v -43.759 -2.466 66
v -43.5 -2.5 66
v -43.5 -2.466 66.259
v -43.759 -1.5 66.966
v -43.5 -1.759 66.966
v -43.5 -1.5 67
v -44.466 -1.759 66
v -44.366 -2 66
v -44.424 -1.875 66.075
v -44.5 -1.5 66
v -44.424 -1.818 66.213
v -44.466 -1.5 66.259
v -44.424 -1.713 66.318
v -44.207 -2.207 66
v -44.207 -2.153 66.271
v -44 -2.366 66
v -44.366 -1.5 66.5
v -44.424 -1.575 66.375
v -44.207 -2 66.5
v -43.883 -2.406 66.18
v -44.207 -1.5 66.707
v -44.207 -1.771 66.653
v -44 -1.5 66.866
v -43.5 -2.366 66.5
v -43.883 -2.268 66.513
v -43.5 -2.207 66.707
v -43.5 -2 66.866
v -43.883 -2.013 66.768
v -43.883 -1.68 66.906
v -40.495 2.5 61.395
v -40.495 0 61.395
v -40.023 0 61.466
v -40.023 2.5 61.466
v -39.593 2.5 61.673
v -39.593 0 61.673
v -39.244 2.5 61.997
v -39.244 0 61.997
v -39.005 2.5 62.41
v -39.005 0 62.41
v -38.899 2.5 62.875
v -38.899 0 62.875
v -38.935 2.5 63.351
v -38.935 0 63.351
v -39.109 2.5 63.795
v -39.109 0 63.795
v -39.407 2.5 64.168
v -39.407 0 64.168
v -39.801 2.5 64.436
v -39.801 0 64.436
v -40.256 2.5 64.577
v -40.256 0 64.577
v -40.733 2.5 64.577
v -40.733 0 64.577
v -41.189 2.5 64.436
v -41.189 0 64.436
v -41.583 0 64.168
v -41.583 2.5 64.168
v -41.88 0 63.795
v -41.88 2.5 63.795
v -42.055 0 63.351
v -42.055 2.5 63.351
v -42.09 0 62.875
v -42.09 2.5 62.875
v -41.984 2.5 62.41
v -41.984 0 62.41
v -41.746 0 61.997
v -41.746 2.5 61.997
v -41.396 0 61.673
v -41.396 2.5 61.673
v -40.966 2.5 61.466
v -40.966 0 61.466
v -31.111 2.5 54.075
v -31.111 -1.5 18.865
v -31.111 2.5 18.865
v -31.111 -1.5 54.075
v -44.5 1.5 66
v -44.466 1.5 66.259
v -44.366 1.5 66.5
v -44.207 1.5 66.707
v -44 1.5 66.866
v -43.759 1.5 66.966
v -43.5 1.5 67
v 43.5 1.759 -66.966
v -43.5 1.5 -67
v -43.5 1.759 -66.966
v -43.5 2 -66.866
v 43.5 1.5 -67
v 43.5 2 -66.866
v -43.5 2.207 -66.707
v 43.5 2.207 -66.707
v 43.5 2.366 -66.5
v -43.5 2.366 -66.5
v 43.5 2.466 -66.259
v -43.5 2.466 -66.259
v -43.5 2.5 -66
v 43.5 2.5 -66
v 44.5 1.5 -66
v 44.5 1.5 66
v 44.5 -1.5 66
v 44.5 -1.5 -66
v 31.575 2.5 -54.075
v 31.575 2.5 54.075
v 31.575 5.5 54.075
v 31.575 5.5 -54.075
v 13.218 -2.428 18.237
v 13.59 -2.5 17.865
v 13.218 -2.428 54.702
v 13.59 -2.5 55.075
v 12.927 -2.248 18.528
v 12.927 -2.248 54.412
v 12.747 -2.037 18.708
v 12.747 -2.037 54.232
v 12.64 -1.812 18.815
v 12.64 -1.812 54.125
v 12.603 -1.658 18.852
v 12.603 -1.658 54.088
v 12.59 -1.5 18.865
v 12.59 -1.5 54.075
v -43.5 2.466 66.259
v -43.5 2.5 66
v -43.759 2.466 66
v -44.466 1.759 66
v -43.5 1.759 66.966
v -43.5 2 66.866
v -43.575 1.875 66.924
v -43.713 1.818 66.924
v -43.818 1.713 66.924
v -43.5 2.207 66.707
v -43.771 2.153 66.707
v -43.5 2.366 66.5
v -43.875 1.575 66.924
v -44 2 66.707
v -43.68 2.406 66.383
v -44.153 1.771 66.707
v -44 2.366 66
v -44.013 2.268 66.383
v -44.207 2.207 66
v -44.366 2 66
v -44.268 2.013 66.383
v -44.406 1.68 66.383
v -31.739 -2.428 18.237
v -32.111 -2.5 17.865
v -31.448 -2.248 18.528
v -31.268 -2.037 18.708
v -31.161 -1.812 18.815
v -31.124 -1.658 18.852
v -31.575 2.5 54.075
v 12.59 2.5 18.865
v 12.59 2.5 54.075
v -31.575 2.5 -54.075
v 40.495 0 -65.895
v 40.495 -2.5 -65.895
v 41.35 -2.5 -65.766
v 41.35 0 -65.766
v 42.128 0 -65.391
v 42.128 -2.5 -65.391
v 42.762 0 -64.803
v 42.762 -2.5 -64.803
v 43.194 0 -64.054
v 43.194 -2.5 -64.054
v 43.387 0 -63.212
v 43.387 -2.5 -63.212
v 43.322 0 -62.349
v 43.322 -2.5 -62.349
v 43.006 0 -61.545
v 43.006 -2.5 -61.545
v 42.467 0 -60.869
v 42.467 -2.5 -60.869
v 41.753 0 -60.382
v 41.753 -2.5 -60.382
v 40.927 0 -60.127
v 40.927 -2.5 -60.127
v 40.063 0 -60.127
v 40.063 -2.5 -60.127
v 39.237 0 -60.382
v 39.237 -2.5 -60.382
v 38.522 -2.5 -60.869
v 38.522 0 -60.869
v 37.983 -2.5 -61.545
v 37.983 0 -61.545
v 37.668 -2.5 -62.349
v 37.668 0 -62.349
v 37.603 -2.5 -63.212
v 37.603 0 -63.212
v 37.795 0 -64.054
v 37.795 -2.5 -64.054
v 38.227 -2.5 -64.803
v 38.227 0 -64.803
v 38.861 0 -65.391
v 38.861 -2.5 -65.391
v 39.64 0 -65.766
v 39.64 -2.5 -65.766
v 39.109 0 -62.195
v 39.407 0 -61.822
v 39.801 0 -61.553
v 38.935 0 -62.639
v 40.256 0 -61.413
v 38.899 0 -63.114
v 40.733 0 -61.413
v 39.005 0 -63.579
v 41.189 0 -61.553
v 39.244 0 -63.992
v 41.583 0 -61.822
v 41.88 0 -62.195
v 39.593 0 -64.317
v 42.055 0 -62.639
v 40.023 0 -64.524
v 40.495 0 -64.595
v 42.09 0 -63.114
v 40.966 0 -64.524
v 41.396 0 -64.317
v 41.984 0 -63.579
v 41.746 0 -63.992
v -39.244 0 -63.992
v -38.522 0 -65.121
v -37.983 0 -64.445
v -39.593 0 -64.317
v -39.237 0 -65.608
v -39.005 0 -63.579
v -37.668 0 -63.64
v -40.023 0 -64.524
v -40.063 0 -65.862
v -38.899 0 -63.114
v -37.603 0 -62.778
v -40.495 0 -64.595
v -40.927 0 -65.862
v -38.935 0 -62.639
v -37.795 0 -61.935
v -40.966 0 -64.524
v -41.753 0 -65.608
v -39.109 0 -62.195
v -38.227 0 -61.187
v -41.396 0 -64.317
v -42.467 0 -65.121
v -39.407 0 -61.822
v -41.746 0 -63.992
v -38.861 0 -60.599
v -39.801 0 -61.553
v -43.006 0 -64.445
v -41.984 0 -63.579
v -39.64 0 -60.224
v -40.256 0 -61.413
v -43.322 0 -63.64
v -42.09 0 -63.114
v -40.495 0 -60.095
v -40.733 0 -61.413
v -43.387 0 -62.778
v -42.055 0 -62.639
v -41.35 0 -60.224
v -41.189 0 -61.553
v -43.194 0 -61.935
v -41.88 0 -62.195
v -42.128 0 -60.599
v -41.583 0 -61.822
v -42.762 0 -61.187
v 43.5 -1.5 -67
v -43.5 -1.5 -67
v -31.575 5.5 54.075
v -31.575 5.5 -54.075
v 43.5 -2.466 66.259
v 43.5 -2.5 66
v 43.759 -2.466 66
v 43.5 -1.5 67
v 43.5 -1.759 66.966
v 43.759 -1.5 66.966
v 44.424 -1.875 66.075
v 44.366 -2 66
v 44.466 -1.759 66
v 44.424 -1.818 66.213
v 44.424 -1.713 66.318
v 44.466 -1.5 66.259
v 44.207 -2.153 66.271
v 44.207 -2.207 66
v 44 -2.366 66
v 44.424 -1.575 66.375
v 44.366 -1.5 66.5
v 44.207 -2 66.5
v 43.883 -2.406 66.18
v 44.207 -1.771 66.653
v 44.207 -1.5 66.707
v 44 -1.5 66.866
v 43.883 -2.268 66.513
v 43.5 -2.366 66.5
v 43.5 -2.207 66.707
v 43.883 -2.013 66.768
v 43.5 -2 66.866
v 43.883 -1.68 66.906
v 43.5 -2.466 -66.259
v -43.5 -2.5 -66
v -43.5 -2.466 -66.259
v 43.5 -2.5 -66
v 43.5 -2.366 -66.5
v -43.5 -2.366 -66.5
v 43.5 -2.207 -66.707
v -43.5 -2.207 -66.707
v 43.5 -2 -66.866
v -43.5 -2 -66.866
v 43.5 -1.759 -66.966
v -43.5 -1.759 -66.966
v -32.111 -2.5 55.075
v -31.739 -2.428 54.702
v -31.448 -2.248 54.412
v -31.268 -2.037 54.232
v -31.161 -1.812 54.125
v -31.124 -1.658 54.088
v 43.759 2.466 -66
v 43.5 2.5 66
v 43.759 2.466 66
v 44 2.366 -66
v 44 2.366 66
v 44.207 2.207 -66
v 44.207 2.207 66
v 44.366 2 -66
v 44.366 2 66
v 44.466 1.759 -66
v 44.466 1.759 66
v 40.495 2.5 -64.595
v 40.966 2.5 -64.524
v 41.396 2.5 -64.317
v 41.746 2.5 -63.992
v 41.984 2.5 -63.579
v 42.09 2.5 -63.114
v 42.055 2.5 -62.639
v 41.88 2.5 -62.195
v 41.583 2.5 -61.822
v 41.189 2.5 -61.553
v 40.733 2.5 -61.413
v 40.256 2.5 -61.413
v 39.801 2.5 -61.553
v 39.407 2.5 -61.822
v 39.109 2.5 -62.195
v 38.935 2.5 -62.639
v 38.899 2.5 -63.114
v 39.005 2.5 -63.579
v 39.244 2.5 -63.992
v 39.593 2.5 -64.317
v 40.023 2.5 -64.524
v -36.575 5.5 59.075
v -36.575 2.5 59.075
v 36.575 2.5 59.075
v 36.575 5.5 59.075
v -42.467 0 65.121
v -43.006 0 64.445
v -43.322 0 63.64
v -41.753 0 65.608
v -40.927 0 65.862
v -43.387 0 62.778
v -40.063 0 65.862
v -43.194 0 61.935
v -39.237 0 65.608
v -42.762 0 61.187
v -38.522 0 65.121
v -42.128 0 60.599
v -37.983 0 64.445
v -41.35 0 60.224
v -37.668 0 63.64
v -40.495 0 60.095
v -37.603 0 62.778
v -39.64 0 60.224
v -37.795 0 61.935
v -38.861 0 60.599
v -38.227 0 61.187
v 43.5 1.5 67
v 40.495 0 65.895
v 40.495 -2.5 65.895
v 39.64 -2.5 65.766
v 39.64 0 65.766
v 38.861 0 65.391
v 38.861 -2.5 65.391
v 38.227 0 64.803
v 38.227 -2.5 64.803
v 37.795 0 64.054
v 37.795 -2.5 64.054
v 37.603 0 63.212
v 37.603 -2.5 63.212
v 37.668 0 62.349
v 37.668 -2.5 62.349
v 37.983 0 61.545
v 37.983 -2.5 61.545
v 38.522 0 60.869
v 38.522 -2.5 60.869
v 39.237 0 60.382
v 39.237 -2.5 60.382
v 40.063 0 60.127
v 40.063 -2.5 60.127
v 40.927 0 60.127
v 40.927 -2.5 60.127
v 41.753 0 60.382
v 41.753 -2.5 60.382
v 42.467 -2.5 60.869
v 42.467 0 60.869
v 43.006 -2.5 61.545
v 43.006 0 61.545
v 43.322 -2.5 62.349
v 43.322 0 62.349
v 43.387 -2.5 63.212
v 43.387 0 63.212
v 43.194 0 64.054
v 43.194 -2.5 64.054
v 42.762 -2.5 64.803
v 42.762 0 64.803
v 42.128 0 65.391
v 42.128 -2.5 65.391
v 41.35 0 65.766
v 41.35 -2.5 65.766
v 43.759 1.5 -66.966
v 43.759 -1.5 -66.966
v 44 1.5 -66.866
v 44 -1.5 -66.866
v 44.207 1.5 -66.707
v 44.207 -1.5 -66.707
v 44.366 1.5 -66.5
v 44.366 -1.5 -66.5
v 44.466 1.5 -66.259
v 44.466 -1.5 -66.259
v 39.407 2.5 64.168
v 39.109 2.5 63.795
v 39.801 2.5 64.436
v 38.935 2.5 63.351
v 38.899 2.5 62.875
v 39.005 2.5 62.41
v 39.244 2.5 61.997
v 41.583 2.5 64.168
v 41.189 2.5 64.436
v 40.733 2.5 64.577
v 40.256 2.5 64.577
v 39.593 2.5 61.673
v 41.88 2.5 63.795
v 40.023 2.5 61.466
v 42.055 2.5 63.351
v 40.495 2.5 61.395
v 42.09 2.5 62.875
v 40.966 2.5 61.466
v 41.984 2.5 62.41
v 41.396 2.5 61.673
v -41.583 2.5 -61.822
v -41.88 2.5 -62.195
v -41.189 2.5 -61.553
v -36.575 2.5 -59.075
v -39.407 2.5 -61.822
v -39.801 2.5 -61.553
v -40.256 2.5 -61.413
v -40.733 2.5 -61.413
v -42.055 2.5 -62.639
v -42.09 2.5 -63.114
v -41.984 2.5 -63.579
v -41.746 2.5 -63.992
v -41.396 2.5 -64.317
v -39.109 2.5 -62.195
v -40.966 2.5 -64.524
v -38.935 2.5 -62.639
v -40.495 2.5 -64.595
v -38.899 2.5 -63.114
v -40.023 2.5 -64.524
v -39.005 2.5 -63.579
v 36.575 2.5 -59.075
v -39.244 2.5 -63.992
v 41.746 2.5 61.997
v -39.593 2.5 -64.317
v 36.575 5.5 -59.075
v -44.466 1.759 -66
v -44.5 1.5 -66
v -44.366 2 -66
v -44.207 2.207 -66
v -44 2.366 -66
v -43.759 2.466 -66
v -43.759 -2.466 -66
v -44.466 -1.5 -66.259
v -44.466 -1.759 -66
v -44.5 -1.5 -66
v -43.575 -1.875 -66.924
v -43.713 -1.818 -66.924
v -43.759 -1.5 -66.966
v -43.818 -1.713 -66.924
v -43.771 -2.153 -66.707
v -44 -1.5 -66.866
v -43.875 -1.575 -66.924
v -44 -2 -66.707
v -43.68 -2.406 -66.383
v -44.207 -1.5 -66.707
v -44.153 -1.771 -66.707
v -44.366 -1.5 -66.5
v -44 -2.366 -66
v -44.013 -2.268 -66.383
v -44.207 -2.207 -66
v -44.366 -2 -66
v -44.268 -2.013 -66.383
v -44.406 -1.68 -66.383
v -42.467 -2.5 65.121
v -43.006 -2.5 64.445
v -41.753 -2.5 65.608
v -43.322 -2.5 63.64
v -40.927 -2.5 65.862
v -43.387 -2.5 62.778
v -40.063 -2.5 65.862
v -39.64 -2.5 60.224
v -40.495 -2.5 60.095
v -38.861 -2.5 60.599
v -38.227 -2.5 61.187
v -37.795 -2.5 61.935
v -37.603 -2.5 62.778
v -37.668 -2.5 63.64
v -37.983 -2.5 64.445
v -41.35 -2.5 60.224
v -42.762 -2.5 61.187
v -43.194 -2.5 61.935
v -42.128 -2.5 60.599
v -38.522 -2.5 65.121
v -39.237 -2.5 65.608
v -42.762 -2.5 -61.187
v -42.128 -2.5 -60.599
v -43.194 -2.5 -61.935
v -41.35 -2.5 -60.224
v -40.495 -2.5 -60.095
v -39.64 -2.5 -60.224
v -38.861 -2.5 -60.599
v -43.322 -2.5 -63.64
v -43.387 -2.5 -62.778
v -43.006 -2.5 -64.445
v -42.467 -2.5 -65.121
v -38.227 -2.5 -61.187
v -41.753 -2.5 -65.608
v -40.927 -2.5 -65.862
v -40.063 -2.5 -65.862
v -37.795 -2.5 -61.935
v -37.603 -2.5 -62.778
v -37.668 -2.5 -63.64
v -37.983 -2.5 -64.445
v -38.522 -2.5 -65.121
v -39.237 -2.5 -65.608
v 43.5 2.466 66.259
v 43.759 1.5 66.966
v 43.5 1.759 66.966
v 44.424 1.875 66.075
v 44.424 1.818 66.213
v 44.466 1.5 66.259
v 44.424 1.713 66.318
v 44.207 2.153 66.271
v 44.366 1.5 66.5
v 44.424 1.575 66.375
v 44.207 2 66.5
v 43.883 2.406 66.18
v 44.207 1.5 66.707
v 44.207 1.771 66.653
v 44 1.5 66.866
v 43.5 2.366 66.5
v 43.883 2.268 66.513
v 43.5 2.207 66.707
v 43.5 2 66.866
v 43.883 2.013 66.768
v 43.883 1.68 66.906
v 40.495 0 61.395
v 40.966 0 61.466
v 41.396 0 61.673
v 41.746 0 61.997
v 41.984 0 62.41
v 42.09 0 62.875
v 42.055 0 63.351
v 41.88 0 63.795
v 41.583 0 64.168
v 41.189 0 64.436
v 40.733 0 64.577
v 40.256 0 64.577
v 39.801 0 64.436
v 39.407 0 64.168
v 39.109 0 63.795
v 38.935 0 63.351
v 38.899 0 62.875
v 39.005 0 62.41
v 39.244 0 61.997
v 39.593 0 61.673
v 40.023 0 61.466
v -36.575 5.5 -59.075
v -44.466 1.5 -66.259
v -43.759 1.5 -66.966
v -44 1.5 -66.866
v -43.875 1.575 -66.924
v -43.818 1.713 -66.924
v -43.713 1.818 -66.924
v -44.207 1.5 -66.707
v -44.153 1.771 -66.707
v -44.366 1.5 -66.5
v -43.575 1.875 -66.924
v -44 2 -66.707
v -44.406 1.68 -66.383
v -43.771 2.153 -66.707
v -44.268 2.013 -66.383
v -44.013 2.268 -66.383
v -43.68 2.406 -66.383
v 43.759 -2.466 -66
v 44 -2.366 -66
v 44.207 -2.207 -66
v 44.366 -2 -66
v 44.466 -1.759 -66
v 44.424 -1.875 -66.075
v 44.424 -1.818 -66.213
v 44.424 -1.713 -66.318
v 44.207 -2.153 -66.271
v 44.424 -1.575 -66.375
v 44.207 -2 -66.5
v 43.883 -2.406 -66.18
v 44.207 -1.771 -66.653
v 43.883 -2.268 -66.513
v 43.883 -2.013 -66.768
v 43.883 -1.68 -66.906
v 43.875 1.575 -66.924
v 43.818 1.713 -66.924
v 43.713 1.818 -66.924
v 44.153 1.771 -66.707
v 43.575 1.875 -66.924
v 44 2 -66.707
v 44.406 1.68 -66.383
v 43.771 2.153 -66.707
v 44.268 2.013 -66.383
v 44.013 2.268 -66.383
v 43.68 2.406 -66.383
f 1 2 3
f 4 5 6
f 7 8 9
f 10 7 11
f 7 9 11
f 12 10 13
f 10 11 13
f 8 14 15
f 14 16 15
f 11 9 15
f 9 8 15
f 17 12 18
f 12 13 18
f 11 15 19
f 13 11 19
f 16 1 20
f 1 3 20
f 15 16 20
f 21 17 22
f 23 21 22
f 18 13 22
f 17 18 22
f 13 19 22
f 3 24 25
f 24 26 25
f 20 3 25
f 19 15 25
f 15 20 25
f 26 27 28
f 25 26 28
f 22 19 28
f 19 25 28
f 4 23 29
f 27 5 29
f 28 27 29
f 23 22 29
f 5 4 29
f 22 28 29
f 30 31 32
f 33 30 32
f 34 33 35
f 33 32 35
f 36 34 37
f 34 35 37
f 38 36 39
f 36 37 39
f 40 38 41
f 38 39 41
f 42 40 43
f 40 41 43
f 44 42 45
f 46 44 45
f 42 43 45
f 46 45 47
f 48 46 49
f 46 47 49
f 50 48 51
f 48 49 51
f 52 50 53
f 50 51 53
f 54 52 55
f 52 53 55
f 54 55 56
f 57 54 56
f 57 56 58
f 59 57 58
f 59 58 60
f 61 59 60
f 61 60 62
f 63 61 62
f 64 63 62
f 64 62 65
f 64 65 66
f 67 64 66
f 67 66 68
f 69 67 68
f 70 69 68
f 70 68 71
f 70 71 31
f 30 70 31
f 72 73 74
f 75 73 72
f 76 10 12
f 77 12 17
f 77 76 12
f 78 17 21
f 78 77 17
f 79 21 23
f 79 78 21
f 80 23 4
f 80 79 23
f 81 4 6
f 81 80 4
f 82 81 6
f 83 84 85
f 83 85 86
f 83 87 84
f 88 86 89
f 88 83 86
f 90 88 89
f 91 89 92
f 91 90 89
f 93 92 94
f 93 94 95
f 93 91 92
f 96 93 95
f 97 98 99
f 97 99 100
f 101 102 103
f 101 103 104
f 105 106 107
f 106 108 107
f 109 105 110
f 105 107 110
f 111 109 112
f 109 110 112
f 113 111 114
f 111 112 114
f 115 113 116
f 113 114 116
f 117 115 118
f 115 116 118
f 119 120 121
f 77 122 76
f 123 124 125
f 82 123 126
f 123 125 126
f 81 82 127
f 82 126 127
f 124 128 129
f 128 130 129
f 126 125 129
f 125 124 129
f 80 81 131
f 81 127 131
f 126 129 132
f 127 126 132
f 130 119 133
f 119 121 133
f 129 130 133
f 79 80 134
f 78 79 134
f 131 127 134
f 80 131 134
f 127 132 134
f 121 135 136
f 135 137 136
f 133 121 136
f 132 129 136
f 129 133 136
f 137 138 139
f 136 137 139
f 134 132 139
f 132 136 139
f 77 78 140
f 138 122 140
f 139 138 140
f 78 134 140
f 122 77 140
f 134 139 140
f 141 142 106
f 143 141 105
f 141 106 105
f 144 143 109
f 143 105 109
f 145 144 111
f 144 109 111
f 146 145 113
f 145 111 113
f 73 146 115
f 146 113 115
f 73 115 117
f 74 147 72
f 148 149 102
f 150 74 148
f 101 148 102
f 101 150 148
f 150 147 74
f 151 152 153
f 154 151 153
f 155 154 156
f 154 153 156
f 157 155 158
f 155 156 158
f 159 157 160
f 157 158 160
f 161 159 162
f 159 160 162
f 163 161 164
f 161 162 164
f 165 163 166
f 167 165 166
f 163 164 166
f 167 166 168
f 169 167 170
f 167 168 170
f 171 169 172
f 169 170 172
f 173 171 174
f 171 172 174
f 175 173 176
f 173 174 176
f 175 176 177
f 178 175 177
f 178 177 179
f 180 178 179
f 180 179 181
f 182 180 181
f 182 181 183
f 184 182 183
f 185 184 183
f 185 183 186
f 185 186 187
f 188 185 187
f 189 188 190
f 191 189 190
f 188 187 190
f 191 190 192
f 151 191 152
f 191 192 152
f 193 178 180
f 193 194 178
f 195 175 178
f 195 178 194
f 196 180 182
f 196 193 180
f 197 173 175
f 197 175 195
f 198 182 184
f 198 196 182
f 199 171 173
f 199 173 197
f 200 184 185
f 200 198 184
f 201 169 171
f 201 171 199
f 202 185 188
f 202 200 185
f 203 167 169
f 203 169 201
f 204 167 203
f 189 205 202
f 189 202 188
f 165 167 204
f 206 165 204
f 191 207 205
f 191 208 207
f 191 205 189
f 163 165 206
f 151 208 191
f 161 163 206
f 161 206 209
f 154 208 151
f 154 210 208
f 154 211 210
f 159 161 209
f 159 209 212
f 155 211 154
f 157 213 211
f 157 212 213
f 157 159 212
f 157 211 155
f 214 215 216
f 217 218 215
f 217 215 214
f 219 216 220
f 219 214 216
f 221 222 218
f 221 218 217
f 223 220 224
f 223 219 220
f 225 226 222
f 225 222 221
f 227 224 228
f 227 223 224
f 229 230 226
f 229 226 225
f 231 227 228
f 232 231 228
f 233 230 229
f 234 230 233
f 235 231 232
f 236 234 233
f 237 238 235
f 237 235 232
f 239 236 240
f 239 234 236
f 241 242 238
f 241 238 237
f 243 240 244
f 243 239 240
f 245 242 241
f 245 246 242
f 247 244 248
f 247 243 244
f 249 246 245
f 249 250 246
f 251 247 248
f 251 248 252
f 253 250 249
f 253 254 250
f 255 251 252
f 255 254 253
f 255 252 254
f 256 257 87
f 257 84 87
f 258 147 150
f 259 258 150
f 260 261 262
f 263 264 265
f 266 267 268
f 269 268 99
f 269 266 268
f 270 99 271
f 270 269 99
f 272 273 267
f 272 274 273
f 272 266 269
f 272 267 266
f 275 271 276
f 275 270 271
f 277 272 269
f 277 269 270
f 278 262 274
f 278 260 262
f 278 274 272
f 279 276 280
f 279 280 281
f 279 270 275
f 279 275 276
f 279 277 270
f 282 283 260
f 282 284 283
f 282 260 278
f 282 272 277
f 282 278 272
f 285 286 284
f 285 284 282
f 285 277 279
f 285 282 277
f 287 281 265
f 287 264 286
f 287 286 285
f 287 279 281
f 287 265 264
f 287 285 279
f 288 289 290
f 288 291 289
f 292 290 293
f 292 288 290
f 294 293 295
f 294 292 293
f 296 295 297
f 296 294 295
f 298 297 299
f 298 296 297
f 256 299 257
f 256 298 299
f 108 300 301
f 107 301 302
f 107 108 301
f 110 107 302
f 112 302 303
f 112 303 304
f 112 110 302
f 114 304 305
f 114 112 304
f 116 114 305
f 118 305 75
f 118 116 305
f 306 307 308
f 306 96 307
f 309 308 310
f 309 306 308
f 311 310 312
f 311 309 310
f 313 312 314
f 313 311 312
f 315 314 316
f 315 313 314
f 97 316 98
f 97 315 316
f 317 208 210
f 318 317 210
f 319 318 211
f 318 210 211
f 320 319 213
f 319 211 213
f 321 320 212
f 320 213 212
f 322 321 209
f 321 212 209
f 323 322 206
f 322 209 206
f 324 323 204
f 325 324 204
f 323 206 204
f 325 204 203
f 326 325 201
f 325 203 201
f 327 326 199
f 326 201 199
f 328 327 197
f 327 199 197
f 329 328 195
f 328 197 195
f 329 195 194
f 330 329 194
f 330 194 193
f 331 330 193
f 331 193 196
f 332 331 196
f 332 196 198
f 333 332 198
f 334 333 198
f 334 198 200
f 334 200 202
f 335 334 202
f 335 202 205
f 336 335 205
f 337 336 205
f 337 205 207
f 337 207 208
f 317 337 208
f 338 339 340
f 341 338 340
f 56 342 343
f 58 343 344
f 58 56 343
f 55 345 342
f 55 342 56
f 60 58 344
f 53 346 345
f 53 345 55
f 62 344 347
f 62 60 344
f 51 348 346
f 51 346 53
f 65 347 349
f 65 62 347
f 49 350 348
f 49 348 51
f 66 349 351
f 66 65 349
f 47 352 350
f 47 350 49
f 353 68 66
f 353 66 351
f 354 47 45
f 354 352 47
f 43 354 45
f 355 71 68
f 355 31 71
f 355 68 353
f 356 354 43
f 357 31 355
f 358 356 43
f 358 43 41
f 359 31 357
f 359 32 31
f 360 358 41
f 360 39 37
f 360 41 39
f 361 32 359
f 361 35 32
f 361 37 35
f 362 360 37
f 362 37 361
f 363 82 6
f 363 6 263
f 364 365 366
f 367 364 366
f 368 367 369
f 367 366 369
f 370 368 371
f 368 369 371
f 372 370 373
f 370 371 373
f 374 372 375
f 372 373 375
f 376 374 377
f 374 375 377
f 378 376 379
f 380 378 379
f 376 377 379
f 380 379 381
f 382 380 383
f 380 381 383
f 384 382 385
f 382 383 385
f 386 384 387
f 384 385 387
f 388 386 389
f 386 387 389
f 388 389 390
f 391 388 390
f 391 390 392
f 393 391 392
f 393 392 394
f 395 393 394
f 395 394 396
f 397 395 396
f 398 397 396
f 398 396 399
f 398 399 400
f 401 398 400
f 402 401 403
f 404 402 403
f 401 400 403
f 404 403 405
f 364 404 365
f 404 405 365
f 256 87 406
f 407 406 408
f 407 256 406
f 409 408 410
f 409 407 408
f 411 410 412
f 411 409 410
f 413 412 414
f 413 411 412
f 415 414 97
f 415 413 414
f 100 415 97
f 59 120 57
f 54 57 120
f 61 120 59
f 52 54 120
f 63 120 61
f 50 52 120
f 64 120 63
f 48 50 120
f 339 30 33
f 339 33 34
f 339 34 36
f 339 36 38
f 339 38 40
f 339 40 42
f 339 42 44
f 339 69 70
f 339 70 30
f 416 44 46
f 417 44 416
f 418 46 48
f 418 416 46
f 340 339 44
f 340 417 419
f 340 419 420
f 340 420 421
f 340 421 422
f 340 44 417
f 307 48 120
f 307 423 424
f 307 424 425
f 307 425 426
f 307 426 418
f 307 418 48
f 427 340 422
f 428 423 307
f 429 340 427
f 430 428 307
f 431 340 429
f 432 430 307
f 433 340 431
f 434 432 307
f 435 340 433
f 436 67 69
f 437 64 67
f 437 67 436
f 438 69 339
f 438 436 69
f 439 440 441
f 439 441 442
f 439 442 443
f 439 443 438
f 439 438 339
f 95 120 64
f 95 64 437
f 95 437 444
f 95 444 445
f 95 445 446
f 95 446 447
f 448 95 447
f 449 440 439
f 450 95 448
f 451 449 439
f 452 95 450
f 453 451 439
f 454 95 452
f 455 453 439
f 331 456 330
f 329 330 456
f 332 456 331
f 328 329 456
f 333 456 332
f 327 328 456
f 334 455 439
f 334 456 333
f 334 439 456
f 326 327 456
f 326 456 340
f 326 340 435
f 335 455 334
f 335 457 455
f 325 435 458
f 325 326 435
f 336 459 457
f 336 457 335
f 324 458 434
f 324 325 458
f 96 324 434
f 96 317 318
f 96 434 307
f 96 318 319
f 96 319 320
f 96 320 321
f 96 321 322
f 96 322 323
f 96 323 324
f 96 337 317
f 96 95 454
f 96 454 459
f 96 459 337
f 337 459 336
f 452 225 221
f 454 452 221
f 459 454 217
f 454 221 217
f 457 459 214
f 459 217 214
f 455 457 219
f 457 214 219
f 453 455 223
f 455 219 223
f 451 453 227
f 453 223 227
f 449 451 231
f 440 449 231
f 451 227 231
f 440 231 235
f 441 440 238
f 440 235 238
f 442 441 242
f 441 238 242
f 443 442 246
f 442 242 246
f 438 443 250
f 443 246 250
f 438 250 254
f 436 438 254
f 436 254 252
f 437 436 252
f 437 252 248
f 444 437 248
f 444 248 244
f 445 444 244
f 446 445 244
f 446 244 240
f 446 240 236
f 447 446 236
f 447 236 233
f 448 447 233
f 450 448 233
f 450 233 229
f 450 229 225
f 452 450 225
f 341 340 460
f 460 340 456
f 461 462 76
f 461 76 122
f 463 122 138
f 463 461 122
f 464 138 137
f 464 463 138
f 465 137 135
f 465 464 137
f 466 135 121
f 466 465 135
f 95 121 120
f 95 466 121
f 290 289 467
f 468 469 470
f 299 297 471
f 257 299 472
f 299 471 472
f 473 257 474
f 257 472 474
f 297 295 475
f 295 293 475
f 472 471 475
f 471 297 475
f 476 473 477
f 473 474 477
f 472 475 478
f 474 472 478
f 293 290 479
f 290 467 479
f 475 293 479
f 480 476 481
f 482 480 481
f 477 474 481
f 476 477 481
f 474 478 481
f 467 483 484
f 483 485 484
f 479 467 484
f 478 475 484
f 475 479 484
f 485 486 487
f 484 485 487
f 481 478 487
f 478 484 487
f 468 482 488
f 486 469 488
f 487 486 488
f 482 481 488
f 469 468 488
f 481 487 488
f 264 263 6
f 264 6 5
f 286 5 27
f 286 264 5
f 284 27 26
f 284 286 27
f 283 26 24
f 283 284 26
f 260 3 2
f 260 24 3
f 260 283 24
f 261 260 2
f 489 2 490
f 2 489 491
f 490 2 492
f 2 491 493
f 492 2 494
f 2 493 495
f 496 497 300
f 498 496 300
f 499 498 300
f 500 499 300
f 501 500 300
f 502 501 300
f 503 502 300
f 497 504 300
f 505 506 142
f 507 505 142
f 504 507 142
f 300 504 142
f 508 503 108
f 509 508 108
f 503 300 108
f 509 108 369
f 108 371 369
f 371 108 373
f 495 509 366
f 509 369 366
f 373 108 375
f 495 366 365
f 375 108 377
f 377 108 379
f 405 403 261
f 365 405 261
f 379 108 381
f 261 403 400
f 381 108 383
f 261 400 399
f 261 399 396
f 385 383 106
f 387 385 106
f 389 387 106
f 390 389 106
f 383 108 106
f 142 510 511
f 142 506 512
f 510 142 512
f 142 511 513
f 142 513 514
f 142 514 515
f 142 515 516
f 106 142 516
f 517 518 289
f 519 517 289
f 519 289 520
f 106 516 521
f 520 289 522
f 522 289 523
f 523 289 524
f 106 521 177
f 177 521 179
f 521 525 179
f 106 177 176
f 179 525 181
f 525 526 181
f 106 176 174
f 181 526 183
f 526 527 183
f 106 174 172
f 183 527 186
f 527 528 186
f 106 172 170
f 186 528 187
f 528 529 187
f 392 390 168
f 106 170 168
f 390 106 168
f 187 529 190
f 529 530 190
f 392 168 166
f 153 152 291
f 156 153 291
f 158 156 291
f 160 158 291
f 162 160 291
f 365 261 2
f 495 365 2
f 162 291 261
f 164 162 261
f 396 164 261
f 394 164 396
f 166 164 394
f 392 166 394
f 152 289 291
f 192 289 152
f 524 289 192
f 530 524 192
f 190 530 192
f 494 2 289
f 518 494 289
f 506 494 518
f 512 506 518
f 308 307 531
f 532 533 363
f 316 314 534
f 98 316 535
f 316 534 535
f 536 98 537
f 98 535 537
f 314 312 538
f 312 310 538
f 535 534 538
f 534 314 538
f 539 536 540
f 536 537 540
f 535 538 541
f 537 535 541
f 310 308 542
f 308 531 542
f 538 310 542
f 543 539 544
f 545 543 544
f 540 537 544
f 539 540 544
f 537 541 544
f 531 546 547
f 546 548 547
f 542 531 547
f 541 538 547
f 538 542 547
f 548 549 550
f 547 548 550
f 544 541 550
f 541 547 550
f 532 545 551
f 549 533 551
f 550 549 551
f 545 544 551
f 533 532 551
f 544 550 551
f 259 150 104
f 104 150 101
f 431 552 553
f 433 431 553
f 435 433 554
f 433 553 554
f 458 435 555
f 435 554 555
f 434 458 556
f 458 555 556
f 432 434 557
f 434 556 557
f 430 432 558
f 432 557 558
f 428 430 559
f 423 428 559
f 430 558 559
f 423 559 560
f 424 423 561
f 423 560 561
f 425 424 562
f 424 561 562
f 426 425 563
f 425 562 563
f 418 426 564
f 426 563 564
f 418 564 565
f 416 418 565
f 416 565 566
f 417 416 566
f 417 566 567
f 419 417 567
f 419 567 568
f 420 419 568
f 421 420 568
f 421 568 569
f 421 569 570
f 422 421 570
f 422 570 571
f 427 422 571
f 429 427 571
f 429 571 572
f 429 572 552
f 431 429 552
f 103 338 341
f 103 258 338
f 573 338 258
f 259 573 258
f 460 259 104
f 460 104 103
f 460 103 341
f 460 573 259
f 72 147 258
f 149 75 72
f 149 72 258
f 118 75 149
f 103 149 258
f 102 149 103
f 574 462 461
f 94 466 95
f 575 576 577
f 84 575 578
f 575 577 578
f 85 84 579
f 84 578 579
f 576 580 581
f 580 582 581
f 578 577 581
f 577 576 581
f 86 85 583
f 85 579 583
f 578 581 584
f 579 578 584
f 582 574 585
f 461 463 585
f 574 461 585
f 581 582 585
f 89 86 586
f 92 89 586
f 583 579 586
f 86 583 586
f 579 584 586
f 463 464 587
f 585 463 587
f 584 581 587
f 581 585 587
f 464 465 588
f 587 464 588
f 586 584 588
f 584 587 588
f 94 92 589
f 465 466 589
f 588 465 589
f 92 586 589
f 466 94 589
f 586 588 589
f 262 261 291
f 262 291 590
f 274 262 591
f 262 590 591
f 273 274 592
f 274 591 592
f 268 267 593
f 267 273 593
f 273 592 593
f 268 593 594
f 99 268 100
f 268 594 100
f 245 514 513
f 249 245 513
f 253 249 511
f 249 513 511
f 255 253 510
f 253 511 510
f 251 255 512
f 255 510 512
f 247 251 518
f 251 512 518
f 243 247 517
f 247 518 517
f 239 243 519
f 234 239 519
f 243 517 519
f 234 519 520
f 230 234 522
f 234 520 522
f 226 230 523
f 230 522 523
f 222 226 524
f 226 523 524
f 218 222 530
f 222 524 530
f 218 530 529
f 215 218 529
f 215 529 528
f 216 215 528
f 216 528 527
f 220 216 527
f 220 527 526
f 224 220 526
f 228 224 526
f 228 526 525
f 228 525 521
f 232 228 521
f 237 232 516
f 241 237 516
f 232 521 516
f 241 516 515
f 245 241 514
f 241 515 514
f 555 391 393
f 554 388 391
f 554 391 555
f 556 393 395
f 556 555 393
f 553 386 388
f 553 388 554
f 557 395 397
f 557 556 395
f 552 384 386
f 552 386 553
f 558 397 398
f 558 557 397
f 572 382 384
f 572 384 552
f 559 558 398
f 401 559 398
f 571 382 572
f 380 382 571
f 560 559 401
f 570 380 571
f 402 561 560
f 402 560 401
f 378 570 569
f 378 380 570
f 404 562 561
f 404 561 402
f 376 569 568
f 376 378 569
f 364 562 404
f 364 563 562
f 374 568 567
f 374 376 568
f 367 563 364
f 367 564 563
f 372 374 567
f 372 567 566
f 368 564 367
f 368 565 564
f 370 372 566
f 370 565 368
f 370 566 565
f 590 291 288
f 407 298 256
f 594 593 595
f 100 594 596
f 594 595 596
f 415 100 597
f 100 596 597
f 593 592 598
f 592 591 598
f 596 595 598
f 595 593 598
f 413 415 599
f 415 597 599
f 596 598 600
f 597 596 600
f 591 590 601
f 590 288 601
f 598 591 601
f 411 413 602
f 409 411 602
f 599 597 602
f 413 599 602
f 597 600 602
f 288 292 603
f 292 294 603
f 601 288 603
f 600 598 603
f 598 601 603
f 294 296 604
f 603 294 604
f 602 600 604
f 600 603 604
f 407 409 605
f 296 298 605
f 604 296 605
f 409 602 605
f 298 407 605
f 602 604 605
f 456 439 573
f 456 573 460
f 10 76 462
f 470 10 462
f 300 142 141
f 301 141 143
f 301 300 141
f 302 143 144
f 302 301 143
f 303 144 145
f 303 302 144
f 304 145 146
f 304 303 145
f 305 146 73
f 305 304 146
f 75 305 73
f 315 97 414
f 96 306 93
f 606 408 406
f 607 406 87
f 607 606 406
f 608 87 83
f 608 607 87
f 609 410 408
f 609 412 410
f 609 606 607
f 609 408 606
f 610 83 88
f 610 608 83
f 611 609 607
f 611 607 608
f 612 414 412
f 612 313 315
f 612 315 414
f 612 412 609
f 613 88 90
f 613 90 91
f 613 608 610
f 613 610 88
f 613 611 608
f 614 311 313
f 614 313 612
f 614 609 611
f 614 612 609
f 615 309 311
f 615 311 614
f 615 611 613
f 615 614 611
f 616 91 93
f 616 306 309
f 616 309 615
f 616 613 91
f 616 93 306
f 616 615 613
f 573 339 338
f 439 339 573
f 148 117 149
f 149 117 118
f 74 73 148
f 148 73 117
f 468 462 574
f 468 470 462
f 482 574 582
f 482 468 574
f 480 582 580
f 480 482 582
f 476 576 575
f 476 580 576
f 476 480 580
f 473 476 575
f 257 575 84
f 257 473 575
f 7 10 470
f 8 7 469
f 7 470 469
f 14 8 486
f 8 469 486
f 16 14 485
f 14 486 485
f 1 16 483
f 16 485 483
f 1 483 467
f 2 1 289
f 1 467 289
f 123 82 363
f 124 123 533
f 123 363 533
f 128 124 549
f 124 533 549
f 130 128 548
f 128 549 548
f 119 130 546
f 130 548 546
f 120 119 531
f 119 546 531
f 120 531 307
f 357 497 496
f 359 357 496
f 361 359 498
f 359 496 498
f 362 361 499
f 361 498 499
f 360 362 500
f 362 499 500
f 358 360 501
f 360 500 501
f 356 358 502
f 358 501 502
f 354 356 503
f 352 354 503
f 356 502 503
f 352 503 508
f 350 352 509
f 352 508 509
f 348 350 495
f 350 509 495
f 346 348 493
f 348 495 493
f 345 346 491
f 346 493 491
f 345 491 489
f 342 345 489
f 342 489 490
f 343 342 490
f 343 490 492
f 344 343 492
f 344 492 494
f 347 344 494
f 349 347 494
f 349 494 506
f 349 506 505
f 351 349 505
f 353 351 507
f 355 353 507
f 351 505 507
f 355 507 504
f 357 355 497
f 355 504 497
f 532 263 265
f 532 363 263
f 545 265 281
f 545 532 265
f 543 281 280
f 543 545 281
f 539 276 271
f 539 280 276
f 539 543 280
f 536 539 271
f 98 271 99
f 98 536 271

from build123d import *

# Parameters (mm, degrees)
SKETCH1_W           = 89
SKETCH1_H           = 134
BOSS_EXTRUDE1_DEPTH = 2.5
SKETCH3_W           = 73.15
SKETCH3_H           = 118.15
SKETCH3_W_2         = 63.15
SKETCH3_H_2         = 108.15
BOSS_EXTRUDE2_DEPTH = 3
CUT_EXTRUDE1_REACH  = 82.829
SKETCH5_W           = 43.701404931
SKETCH5_H           = 35.210158561
FILLET1_R           = 1
SKETCH8_R           = 2.9
CUT_EXTRUDE2_DEPTH  = 2.5
CUT_EXTRUDE3_REACH  = 82.619
SKETCH9_R           = 1.6


with BuildPart() as part:
    # Sketch1 → Boss-Extrude1 (new, symmetric)
    with BuildSketch(Plane(origin=(0, 0, 0), x_dir=(1, 0, 0), z_dir=(0, 1, 0))):
        Rectangle(SKETCH1_W, SKETCH1_H)
    extrude(amount=BOSS_EXTRUDE1_DEPTH, both=True)

    # Sketch3 → Boss-Extrude2 (add)
    with BuildSketch(Plane(origin=(0, 2.5, 0), x_dir=(1, 0, 0), z_dir=(0, 1, 0))):
        Rectangle(SKETCH3_W, SKETCH3_H)
        Rectangle(SKETCH3_W_2, SKETCH3_H_2, mode=Mode.SUBTRACT)
    extrude(amount=BOSS_EXTRUDE2_DEPTH)

    # Sketch5 → Cut-Extrude1 (cut, up to next)
    with BuildSketch(Plane.XZ.offset(2.5), mode=Mode.PRIVATE) as cut_extrude1_sk1:
        with Locations((-9.260550175, 36.46992072)):
            Rectangle(SKETCH5_W, SKETCH5_H)
    cut_extrude1_tool1 = extrude(cut_extrude1_sk1.sketch, amount=-CUT_EXTRUDE1_REACH, mode=Mode.PRIVATE) & part.part
    add(cut_extrude1_tool1.solids().sort_by_distance((-9.26055, -2.5, 36.469921))[0], mode=Mode.SUBTRACT)

    # Fillet1
    fillet1_edges = [part.edges().sort_by_distance(p)[0] for p in [
        (-44.5, 2.5, 0),
        (0, 2.5, 67),
        (-31.11125264, -2.5, 36.46992072),
        (-9.260550175, -2.5, 18.864841439),
        (12.590152291, -2.5, 36.46992072),
        (-9.260550175, -2.5, 54.075),
        (44.5, 2.5, 0),
        (0, -2.5, 67),
        (-44.5, -2.5, 0),
        (0, -2.5, -67),
        (44.5, -2.5, 0),
        (44.5, 0, 67),
        (-44.5, 0, 67),
        (-44.5, 0, -67),
        (44.5, 0, -67),
        (0, 2.5, -67),
    ]]
    fillet(fillet1_edges, radius=FILLET1_R)

    # Sketch8 → Cut-Extrude2 (cut)
    with BuildSketch(Plane.XZ.offset(2.5)):
        with Locations(Location((40.49479618, -62.99479618, 0), (0, 0, 270))):
            Circle(SKETCH8_R)
        with Locations(Location((-40.49479618, -62.99479618, 0), (0, 0, 90))):
            Circle(SKETCH8_R)
        with Locations(Location((40.49479618, 62.99479618, 0), (0, 0, 90))):
            Circle(SKETCH8_R)
        with Locations(Location((-40.49479618, 62.99479618, 0), (0, 0, 270))):
            Circle(SKETCH8_R)
    extrude(amount=-CUT_EXTRUDE2_DEPTH, mode=Mode.SUBTRACT)

    # Sketch9 → Cut-Extrude3 (cut, up to next)
    with BuildSketch(Plane.XZ, mode=Mode.PRIVATE) as cut_extrude3_sk1:
        with Locations(Location((40.49479618, -62.99479618, 0), (0, 0, 270))):
            Circle(SKETCH9_R)
    cut_extrude3_tool1 = extrude(cut_extrude3_sk1.sketch, amount=-CUT_EXTRUDE3_REACH, mode=Mode.PRIVATE) & part.part
    # Sketch9 → Cut-Extrude3 (cut, up to next)
    with BuildSketch(Plane.XZ, mode=Mode.PRIVATE) as cut_extrude3_sk2:
        with Locations(Location((-40.49479618, -62.99479618, 0), (0, 0, 270))):
            Circle(SKETCH9_R)
    cut_extrude3_tool2 = extrude(cut_extrude3_sk2.sketch, amount=-CUT_EXTRUDE3_REACH, mode=Mode.PRIVATE) & part.part
    # Sketch9 → Cut-Extrude3 (cut, up to next)
    with BuildSketch(Plane.XZ, mode=Mode.PRIVATE) as cut_extrude3_sk3:
        with Locations(Location((40.49479618, 62.99479618, 0), (0, 0, 270))):
            Circle(SKETCH9_R)
    cut_extrude3_tool3 = extrude(cut_extrude3_sk3.sketch, amount=-CUT_EXTRUDE3_REACH, mode=Mode.PRIVATE) & part.part
    # Sketch9 → Cut-Extrude3 (cut, up to next)
    with BuildSketch(Plane.XZ, mode=Mode.PRIVATE) as cut_extrude3_sk4:
        with Locations(Location((-40.49479618, 62.99479618, 0), (0, 0, 270))):
            Circle(SKETCH9_R)
    cut_extrude3_tool4 = extrude(cut_extrude3_sk4.sketch, amount=-CUT_EXTRUDE3_REACH, mode=Mode.PRIVATE) & part.part
    add(cut_extrude3_tool1.solids().sort_by_distance((40.494796, 0, -62.994796))[0], mode=Mode.SUBTRACT)
    add(cut_extrude3_tool2.solids().sort_by_distance((-40.494796, 0, -62.994796))[0], mode=Mode.SUBTRACT)
    add(cut_extrude3_tool3.solids().sort_by_distance((40.494796, 0, 62.994796))[0], mode=Mode.SUBTRACT)
    add(cut_extrude3_tool4.solids().sort_by_distance((-40.494796, 0, 62.994796))[0], mode=Mode.SUBTRACT)


solid = part.part
